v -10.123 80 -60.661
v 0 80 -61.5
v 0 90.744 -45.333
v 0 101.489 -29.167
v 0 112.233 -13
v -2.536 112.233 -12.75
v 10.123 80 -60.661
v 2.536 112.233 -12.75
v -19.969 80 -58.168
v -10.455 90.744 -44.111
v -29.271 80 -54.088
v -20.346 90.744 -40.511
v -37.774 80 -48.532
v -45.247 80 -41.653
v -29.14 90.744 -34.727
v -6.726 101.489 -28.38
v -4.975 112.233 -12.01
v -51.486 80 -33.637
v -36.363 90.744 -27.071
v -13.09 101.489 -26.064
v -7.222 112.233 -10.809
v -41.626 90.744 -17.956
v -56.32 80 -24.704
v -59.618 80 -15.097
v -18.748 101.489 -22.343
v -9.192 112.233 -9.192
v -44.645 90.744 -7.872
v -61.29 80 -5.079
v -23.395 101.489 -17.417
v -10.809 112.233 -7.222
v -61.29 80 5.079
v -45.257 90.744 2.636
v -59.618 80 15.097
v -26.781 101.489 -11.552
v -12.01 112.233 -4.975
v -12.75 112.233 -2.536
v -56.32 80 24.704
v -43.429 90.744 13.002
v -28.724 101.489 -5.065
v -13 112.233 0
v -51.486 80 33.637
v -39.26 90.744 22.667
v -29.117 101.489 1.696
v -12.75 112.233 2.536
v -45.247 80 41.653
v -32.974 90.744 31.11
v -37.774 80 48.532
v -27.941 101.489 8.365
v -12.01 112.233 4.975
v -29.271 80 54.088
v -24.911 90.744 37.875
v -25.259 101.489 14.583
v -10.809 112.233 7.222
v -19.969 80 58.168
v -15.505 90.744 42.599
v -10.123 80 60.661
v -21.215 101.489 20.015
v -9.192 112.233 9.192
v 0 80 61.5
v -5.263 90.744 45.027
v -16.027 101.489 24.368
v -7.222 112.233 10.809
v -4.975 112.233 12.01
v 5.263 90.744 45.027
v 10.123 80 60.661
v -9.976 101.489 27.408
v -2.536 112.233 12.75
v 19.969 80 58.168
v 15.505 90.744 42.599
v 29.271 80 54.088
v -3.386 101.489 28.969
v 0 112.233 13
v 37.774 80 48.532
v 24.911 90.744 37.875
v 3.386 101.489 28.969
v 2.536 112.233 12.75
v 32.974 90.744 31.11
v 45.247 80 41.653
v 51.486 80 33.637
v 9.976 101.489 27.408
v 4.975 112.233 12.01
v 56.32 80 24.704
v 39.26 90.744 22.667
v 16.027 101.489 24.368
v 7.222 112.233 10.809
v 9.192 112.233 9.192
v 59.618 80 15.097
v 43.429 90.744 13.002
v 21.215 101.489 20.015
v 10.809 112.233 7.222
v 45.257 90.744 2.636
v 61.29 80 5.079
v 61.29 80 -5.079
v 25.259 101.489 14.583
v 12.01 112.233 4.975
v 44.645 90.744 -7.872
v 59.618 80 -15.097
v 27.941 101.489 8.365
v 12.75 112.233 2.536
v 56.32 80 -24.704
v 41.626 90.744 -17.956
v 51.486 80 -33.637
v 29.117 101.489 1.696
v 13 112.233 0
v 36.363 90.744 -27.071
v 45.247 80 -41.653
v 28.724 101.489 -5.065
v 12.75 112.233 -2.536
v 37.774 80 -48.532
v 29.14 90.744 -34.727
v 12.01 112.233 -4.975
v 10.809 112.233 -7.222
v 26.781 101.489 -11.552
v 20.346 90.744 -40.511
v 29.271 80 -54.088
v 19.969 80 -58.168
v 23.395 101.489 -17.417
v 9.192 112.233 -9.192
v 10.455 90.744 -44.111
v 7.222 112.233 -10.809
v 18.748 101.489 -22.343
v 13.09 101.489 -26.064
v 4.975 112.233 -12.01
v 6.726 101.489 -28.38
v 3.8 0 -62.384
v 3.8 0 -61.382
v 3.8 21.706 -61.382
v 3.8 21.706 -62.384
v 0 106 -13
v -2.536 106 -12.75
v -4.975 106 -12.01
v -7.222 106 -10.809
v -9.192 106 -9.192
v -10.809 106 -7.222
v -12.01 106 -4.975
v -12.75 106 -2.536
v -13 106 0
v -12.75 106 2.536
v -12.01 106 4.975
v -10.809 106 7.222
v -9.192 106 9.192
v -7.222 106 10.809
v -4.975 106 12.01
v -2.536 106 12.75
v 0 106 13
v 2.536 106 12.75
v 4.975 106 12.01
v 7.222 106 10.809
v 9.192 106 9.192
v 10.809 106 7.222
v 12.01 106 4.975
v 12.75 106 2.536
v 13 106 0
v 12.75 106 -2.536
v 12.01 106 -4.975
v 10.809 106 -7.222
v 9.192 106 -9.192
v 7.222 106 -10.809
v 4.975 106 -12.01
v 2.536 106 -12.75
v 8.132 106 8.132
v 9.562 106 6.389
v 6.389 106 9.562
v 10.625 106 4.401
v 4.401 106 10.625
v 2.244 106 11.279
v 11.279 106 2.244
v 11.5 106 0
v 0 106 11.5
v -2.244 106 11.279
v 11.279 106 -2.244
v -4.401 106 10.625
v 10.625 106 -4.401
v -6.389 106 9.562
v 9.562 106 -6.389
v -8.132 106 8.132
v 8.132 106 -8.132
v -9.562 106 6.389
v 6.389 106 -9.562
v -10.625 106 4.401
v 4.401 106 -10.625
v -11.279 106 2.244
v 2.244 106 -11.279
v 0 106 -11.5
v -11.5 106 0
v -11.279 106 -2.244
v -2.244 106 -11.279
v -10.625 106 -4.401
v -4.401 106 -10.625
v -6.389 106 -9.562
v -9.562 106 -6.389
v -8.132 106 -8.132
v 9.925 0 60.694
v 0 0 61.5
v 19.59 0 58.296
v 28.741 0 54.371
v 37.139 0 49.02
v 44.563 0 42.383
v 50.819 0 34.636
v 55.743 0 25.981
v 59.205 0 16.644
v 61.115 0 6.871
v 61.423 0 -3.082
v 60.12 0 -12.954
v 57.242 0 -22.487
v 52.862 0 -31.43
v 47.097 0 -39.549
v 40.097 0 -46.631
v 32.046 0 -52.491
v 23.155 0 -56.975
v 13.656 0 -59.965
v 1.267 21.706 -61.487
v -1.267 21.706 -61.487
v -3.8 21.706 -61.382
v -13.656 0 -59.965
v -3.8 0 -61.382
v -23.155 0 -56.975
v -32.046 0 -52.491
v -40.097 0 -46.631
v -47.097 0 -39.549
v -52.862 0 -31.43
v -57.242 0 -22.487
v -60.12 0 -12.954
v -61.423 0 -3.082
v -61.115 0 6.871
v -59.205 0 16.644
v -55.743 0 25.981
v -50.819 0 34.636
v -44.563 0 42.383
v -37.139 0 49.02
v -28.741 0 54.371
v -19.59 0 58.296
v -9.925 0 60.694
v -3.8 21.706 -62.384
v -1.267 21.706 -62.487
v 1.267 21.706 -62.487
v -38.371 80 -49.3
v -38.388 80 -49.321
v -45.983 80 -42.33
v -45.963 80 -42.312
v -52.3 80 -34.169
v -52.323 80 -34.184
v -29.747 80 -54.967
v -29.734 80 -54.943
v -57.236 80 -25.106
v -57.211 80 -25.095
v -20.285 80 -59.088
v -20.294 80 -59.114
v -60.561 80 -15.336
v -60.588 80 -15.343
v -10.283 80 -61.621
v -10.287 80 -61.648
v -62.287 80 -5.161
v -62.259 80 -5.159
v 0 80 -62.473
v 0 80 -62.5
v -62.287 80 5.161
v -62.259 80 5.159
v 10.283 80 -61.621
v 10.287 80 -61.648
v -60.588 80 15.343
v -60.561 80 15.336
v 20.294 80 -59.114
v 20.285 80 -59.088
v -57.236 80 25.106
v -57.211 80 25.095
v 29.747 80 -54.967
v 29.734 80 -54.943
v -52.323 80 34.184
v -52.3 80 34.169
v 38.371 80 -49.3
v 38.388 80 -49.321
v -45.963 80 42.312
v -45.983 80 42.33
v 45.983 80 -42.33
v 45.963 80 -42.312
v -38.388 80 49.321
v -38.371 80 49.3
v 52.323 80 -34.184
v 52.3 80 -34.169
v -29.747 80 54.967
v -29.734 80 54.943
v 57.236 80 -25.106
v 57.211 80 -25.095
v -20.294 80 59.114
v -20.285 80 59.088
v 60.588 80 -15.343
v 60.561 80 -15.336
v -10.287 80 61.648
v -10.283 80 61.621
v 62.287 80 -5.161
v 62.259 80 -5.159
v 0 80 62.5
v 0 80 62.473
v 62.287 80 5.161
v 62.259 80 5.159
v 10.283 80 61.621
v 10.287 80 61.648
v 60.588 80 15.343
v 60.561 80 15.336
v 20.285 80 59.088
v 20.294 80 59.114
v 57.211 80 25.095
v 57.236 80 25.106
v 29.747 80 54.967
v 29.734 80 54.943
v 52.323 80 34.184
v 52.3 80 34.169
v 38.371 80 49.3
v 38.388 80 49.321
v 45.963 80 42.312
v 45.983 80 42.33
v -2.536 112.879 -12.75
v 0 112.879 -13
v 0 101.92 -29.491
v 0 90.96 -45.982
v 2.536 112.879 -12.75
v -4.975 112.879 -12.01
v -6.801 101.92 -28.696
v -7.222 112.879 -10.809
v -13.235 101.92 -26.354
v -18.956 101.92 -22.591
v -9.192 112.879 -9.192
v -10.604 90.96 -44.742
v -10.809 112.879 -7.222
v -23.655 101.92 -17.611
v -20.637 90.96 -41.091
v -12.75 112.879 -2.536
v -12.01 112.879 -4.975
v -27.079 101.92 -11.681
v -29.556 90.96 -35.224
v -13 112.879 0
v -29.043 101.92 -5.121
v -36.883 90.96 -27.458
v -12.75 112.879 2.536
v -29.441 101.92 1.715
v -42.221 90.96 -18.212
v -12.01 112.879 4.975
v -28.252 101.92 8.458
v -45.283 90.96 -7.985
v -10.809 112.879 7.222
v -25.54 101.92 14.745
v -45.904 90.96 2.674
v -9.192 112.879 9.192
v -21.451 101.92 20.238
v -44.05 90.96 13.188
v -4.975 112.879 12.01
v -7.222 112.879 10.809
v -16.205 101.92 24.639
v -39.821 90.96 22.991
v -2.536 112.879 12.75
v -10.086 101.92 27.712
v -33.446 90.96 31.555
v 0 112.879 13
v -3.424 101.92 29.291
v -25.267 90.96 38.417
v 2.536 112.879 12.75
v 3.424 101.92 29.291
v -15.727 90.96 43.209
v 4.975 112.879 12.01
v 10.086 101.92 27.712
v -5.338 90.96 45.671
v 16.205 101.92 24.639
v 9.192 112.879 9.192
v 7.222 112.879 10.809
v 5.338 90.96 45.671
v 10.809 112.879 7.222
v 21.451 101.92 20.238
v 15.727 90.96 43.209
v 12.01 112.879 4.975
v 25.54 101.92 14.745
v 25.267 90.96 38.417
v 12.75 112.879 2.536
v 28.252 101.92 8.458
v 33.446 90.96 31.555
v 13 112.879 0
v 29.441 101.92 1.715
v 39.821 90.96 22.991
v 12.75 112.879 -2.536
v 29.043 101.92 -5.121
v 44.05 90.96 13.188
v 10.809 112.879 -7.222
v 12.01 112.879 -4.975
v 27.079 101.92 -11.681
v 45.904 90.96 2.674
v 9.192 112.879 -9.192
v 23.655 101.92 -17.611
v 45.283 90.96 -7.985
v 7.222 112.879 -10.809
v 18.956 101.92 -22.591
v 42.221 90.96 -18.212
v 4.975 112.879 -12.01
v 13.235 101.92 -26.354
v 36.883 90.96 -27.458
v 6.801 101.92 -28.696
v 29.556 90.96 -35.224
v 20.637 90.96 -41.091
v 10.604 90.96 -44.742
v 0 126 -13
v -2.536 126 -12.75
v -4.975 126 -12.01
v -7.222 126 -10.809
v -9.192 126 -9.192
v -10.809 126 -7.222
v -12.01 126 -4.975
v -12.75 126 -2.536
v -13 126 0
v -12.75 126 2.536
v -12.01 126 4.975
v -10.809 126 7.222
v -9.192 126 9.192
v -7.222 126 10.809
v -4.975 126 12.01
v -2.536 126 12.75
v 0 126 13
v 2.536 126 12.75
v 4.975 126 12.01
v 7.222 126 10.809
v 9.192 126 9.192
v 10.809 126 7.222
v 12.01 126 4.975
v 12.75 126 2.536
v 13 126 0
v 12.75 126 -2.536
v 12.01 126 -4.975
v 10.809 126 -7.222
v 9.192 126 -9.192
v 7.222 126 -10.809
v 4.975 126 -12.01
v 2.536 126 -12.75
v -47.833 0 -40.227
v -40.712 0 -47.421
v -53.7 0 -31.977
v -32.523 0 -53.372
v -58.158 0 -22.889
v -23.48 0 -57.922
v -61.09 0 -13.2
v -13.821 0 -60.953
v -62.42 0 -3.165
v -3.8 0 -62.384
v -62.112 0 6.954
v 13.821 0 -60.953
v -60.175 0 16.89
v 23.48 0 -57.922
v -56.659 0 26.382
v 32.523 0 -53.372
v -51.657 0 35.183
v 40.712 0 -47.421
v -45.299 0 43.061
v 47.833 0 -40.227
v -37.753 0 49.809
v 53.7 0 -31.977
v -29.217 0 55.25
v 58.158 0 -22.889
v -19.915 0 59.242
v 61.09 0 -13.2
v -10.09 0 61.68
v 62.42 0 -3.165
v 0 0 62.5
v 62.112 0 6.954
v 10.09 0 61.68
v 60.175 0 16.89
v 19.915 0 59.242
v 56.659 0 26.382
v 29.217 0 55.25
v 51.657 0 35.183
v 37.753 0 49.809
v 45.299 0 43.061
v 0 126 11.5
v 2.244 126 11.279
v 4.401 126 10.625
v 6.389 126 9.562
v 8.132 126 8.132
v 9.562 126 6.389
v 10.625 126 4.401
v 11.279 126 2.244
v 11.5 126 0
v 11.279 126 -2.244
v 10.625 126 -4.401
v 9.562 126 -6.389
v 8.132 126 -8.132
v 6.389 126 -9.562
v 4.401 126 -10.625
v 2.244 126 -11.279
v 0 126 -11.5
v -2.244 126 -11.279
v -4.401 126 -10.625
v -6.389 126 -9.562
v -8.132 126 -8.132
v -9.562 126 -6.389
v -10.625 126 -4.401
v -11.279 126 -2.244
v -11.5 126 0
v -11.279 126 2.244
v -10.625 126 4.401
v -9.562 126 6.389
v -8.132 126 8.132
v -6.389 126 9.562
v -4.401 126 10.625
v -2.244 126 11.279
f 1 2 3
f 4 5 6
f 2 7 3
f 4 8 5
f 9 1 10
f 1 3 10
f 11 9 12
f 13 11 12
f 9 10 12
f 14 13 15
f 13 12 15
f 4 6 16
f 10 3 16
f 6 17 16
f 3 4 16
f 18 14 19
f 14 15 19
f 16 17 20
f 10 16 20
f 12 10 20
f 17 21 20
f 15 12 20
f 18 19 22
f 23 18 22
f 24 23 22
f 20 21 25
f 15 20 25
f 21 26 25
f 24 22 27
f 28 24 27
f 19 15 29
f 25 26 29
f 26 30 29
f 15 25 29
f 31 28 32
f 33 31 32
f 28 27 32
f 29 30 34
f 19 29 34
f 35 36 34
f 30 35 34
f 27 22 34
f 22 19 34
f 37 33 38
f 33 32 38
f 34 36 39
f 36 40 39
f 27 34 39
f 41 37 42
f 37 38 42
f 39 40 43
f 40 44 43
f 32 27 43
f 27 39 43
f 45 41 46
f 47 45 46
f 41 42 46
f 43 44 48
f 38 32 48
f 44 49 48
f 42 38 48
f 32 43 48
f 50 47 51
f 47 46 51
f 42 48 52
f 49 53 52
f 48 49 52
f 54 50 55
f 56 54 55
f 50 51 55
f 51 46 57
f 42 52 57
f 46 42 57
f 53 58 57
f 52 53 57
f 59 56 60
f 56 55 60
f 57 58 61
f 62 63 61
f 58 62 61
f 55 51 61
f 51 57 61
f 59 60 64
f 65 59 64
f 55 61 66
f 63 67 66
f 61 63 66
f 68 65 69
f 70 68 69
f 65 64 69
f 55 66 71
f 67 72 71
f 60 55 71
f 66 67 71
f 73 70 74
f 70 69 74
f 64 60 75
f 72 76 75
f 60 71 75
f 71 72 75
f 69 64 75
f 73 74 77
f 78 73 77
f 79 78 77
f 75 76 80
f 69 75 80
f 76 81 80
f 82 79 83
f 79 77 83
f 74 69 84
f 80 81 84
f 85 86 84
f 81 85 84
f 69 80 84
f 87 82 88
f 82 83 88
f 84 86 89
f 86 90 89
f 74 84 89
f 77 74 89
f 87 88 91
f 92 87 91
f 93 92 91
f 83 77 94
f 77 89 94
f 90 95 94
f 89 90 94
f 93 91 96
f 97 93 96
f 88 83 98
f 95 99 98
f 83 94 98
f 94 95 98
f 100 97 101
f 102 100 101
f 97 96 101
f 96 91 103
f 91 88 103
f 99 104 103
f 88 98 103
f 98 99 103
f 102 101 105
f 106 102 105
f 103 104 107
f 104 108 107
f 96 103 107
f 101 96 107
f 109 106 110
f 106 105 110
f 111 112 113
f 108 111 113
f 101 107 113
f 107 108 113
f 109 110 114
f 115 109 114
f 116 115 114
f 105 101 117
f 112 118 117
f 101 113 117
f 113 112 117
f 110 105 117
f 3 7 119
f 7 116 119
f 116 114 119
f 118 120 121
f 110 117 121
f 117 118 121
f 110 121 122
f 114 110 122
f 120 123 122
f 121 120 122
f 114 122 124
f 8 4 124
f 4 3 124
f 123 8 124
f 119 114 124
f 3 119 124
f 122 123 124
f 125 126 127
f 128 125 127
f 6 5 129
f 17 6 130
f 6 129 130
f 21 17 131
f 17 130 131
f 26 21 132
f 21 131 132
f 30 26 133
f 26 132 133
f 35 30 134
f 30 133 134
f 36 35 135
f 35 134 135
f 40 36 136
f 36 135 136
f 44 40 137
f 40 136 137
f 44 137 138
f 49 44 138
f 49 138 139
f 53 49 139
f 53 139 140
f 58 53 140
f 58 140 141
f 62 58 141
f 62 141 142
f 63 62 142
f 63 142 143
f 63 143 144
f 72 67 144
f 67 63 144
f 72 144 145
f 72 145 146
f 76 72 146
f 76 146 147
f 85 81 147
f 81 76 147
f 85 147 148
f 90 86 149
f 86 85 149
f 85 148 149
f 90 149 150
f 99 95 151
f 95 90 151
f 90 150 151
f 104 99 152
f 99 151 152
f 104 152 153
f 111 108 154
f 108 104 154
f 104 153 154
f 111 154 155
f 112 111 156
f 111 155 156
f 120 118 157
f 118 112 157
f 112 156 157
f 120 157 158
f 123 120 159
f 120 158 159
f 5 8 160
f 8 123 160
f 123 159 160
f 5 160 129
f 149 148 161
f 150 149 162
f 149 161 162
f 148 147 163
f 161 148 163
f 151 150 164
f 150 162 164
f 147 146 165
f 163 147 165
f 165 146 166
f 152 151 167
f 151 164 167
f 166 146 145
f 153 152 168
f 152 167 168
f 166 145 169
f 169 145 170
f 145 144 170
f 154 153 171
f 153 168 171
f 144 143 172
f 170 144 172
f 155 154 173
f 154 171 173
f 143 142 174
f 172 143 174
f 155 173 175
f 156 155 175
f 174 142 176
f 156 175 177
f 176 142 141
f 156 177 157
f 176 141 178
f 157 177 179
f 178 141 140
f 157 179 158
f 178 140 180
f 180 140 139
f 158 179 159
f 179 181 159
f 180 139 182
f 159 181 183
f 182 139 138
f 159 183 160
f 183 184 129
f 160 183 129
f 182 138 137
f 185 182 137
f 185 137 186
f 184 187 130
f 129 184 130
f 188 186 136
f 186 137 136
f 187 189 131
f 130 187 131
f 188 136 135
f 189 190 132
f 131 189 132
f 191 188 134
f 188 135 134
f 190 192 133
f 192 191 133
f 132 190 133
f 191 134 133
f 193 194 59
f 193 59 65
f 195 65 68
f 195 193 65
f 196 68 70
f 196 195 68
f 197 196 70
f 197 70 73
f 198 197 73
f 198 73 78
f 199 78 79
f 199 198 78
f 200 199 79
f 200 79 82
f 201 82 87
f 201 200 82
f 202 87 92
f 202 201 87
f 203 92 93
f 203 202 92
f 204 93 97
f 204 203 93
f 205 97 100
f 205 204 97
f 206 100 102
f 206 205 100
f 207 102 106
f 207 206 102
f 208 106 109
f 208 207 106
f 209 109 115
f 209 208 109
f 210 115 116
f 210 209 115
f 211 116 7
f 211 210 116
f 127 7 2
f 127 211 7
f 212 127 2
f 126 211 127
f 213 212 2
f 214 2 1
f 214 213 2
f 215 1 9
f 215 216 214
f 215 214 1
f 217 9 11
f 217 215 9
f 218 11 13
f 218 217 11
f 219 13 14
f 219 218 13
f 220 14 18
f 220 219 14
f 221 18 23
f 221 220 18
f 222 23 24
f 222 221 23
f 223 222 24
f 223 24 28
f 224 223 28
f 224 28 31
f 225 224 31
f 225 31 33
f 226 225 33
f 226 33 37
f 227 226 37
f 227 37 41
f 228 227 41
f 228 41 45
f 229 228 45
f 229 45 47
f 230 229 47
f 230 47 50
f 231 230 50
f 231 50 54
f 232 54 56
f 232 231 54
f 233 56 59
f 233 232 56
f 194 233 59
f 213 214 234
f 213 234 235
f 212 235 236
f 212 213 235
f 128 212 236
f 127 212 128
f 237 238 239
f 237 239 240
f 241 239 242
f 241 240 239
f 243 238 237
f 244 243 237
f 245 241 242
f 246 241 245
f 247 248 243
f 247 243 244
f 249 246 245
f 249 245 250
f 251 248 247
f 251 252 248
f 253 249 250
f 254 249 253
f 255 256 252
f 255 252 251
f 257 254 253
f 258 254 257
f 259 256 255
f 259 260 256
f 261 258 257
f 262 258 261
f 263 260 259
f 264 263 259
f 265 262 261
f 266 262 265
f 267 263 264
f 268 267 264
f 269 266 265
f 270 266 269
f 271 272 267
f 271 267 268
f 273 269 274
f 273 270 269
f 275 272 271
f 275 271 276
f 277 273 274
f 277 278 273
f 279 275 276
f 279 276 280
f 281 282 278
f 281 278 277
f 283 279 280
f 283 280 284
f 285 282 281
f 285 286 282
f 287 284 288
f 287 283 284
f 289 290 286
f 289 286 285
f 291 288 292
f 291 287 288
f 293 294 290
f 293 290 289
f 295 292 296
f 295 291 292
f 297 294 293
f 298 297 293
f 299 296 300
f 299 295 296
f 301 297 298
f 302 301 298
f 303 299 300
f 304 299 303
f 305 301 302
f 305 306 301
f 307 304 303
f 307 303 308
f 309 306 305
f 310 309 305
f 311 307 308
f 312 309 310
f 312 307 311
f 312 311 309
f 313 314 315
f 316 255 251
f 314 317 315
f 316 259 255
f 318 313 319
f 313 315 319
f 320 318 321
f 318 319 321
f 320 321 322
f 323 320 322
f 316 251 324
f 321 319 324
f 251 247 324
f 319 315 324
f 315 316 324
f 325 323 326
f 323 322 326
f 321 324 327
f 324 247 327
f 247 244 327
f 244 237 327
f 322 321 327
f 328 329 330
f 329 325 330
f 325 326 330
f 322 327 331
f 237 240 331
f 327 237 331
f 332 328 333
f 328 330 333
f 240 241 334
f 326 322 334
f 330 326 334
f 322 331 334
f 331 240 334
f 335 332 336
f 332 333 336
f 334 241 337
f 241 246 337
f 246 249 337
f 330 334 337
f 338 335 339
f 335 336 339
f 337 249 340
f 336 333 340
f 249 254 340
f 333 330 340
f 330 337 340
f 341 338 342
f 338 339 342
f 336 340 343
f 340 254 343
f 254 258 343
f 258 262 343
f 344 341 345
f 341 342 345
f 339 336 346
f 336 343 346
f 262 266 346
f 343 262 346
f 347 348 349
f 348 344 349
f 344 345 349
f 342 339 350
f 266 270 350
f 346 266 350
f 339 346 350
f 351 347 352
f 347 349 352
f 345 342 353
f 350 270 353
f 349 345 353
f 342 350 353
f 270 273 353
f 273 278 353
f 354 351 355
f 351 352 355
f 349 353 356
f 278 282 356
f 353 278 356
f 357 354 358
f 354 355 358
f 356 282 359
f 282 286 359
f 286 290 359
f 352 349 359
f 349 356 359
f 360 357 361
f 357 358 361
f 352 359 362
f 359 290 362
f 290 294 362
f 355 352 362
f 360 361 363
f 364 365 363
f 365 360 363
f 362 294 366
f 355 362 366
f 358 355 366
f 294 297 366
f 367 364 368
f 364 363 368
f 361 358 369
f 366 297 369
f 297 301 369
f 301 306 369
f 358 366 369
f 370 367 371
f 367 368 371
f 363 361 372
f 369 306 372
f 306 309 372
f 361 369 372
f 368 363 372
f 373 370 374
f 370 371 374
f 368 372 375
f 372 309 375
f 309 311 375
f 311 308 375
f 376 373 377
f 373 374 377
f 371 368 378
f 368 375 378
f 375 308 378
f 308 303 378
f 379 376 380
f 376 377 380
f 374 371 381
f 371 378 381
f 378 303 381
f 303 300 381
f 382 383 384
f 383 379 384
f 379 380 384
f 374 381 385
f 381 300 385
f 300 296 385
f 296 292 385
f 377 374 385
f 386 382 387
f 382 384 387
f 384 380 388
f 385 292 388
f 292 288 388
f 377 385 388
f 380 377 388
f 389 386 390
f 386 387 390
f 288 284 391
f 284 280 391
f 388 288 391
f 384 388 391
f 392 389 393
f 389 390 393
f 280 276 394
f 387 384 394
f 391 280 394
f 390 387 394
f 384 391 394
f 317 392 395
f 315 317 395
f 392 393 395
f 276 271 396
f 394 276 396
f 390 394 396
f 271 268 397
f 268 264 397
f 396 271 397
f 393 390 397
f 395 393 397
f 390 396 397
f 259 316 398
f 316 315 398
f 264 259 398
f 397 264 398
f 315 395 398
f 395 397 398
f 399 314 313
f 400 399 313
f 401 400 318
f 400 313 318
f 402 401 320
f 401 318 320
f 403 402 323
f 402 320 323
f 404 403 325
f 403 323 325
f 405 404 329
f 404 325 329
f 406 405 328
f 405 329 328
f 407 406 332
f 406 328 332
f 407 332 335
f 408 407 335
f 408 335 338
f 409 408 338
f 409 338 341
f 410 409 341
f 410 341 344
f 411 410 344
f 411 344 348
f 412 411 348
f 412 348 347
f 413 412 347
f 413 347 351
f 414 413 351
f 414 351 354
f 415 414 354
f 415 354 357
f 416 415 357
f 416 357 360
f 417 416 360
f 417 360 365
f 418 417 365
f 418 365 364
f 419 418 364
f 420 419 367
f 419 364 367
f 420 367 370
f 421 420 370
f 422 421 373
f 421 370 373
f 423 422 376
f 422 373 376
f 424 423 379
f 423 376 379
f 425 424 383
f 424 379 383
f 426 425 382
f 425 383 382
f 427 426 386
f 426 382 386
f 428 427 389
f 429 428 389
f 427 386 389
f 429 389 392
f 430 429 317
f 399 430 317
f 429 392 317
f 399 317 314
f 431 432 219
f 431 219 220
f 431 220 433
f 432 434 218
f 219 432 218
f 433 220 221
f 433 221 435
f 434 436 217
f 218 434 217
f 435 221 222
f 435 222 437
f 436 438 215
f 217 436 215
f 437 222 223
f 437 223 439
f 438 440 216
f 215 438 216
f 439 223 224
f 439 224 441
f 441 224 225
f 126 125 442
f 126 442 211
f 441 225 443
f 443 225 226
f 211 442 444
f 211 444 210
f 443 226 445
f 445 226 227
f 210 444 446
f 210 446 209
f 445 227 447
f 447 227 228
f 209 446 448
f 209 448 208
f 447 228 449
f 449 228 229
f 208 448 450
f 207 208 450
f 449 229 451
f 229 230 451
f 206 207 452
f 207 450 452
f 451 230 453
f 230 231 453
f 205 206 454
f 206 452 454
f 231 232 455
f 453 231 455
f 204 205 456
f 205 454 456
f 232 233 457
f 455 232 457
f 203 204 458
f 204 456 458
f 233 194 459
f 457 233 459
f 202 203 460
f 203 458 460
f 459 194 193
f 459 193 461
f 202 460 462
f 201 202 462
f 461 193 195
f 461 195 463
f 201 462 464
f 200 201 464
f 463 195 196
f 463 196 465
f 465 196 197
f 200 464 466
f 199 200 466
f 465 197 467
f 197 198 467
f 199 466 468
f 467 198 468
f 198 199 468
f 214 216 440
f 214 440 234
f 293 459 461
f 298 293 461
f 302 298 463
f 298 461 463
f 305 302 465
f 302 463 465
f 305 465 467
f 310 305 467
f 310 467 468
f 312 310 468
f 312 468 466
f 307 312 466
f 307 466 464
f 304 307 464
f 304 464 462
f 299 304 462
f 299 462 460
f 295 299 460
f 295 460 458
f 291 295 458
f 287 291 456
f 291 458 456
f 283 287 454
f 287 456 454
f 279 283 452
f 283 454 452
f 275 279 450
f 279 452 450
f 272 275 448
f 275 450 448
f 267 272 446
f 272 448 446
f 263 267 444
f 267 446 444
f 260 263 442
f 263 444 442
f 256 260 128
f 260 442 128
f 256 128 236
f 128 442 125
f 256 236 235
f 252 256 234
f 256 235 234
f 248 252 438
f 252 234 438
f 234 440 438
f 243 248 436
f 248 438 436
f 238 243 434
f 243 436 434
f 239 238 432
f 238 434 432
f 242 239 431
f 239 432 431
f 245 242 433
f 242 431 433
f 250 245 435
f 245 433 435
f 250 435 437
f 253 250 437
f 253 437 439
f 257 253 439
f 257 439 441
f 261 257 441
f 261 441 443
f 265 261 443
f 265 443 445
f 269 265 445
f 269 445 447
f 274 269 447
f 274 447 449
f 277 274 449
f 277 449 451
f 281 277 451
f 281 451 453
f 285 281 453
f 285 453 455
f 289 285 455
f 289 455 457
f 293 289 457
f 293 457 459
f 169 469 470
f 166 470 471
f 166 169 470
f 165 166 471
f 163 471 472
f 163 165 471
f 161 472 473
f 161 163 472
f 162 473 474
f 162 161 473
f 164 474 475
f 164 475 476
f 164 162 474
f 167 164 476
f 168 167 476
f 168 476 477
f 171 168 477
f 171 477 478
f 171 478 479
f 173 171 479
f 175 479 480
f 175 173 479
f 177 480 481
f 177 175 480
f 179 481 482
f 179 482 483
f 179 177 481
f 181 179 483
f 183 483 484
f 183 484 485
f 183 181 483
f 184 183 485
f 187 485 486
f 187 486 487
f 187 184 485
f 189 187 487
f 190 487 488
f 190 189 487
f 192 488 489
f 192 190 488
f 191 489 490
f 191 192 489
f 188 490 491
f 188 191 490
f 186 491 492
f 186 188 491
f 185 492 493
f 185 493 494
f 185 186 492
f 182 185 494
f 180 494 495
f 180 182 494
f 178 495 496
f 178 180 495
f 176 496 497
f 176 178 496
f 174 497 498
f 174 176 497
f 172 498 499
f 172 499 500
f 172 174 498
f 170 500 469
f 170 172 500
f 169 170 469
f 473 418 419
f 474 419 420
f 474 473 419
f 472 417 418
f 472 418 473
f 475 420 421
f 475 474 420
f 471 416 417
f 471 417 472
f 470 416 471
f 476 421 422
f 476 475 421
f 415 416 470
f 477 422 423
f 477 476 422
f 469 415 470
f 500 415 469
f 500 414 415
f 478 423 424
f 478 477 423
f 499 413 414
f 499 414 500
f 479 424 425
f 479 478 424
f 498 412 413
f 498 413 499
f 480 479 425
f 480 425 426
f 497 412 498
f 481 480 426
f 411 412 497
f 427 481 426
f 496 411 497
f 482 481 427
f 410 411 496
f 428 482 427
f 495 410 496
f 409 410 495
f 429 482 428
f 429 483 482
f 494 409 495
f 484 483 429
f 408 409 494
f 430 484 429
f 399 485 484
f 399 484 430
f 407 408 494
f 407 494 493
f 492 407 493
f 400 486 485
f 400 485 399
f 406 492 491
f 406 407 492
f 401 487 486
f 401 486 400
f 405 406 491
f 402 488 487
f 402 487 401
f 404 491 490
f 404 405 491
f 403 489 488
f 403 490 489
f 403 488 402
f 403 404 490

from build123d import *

# Parameters (mm, degrees)
SKETCH1_R           = 62.5
SKETCH1_R_2         = 61.5
BOSS_EXTRUDE1_DEPTH = 80
SKETCH3_W           = 7.6
SKETCH3_H           = 23.660429452
CUT_EXTRUDE1_DEPTH  = 80
SKETCH5_R           = 12.3
CUT_EXTRUDE3_DEPTH  = 229
BOSS_EXTRUDE3_START = 106
SKETCH6_R           = 13
SKETCH6_R_2         = 11.5
BOSS_EXTRUDE3_DEPTH = 20


with BuildPart() as part:
    # Sketch1 → Boss-Extrude1 (new body)
    with BuildSketch(Plane(origin=(0, 0, 0), x_dir=(1, 0, 0), z_dir=(0, 1, 0))):
        with Locations(Location((0, 0, 0), (0, 0, 270))):
            Circle(SKETCH1_R)
        with Locations(Location((0, 0, 0), (0, 0, 270))):
            Circle(SKETCH1_R_2, mode=Mode.SUBTRACT)
    extrude(amount=BOSS_EXTRUDE1_DEPTH)

    # Sketch2 → Revolve1 (revolve)
    with BuildSketch(Plane.XY, mode=Mode.PRIVATE) as revolve1_sk:
        Polygon((-62.472592019, 80), (-62.472592019, 79.276884175), (-61.5, 79.276884175), (-61.5, 80), (-4.8, 117.682815259), (-4.8, 129.995512562), (-8, 129.995512562), (-8, 127), (-6.8, 127), (-6.8, 117), align=None)
    revolve(revolve1_sk.sketch.rotate(Axis((0, 80, 0), (0, 1, 0)), 270), axis=Axis((0, 80, 0), (0, 1, 0)))

    # Sketch3 → Cut-Extrude1 (cut)
    with BuildSketch(Plane.XY):
        with Locations((0, 9.876009184)):
            Rectangle(SKETCH3_W, SKETCH3_H)
    extrude(amount=-CUT_EXTRUDE1_DEPTH, mode=Mode.SUBTRACT)

    # Sketch5 → Cut-Extrude3 (cut)
    with BuildSketch(Plane(origin=(0, 0, 0), x_dir=(1, 0, 0), z_dir=(0, 1, 0))):
        with Locations(Location((0, 0, 0), (0, 0, 90))):
            Circle(SKETCH5_R)
    extrude(amount=CUT_EXTRUDE3_DEPTH, mode=Mode.SUBTRACT)

    # Sketch6 → Boss-Extrude3 (add)
    with BuildSketch(Plane(origin=(0, 0, 0), x_dir=(1, 0, 0), z_dir=(0, 1, 0)).offset(BOSS_EXTRUDE3_START)):
        with Locations(Location((0, 0, 0), (0, 0, 90))):
            Circle(SKETCH6_R)
        with Locations(Location((0, 0, 0), (0, 0, 270))):
            Circle(SKETCH6_R_2, mode=Mode.SUBTRACT)
    extrude(amount=BOSS_EXTRUDE3_DEPTH)


solid = part.part
